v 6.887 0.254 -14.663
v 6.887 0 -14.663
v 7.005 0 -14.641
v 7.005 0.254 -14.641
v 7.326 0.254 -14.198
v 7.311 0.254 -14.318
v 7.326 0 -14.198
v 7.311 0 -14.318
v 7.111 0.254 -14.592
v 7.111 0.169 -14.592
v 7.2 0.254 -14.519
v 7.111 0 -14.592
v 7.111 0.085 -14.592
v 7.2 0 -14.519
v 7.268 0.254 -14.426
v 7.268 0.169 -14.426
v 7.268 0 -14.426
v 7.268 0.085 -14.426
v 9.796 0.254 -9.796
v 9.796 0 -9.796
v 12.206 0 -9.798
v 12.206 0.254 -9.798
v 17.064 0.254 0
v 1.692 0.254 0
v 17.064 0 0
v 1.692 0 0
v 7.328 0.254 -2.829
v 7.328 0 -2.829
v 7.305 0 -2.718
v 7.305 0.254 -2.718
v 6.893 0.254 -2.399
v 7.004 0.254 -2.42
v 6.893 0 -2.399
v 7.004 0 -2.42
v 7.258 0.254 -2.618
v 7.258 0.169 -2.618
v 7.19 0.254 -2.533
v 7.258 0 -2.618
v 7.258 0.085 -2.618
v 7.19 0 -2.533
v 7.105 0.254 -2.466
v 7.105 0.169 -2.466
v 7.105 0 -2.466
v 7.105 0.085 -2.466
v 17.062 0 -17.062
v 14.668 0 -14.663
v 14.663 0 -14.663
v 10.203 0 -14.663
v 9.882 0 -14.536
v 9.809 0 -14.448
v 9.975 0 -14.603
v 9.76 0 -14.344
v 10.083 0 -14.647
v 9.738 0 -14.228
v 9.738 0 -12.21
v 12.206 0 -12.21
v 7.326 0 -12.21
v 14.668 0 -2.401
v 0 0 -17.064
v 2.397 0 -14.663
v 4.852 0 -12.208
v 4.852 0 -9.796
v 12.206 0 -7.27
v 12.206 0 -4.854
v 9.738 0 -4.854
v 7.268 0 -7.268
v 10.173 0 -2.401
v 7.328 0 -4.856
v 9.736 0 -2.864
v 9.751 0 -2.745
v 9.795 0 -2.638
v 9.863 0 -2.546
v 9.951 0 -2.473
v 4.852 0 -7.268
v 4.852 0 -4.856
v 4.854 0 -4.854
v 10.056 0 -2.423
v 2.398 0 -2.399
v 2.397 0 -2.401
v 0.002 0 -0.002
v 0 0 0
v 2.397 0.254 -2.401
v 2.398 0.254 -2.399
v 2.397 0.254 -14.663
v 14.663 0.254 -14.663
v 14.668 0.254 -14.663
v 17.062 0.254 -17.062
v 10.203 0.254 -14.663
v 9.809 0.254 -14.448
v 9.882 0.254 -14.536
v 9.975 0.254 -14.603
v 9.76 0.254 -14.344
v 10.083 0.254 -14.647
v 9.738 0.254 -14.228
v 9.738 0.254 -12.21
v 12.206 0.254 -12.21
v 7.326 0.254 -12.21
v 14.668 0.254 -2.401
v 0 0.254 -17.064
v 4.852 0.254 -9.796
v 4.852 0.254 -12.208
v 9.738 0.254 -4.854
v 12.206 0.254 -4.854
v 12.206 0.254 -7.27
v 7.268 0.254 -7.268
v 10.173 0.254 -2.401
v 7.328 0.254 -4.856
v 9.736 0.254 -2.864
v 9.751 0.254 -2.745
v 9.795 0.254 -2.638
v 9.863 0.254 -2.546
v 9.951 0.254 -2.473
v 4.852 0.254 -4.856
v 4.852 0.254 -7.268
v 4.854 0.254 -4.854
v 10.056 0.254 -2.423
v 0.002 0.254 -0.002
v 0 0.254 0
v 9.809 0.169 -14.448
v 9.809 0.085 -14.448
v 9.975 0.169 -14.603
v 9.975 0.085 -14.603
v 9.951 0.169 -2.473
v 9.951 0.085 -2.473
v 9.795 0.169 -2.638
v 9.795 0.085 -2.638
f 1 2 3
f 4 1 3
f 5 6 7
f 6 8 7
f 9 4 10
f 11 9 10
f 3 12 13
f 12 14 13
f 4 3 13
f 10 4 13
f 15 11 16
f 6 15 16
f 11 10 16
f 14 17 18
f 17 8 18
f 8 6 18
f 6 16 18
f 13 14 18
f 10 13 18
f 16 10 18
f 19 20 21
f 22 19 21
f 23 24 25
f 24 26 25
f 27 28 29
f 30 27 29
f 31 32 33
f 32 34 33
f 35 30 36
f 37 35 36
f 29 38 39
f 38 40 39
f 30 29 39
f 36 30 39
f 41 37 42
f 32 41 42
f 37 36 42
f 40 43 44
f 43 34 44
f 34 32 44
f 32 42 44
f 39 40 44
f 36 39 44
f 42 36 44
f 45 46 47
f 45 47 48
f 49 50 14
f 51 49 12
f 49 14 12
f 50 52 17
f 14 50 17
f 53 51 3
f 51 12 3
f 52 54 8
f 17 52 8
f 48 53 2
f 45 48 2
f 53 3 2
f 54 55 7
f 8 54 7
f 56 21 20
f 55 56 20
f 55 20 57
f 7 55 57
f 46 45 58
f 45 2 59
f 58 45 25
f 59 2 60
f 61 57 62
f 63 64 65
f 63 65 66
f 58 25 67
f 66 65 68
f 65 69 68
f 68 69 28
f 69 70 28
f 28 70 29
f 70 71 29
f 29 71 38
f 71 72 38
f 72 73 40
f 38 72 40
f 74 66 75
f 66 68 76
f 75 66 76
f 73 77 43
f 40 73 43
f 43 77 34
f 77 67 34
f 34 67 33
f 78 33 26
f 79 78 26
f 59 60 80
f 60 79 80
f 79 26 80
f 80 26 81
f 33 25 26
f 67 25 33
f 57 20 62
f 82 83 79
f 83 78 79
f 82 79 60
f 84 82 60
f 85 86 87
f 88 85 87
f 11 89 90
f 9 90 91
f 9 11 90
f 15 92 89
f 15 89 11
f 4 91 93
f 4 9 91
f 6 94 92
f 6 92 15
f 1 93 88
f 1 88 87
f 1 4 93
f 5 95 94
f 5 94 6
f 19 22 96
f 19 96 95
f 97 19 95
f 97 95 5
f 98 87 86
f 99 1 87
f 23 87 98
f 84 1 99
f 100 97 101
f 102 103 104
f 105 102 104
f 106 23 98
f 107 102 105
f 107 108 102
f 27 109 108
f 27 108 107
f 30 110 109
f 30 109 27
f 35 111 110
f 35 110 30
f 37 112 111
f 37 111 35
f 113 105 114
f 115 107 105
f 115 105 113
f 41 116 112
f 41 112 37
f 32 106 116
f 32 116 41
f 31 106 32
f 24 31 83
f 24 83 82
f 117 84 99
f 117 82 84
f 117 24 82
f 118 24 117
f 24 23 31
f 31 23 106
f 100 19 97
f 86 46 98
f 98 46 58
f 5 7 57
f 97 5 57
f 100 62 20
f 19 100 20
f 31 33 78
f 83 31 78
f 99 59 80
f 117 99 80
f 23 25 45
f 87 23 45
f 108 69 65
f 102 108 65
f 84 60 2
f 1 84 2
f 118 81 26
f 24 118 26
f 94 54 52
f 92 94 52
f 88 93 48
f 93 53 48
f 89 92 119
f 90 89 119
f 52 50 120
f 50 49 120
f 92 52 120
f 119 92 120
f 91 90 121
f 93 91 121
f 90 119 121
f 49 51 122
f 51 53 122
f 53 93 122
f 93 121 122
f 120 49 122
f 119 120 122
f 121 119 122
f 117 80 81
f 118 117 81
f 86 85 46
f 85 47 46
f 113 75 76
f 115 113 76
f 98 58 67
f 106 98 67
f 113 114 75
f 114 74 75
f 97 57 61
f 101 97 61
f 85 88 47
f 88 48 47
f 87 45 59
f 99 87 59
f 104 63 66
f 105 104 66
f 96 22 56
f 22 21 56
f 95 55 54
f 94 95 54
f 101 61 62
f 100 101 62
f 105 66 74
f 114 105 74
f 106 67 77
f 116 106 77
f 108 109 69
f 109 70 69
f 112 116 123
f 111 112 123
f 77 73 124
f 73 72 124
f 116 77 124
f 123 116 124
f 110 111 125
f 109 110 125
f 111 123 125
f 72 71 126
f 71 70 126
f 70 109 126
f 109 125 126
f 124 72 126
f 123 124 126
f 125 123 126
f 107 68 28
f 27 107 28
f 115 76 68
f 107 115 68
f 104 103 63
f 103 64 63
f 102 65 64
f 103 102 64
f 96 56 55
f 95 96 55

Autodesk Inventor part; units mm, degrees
ref_plane "YZ Plane" through (0, 0, 0) normal (1, 0, 0) x (0, 1, 0)
ref_plane "XZ Plane" through (0, 0, 0) normal (0, 1, 0) x (-1, 0, 0)
ref_plane "XY Plane" through (0, 0, 0) normal (0, 0, 1) x (1, 0, 0)
sketch "Sketch1" plane through (0, 0, 0) normal (0, 1, 0) x (-1, 0, 0)
  line L0 (0.0001, 0.003) -> (0.0001, 0)
  line L1 (0.0001, -17.064) -> (-0.002, -0.0021)
  line L2 (-2.3966, -2.4008) -> (-2.3966, -14.6631)
  line L3 (-2.3966, -14.6631) -> (-6.8866, -14.6631)
  spline S0 degree 3 poles (-6.8866, -14.6631) (-7.1334, -14.6502) (-7.3283, -14.4466) (-7.3261, -14.1977) knots 2 2 2 2 3 3 3 3
  line L4 (-6.8866, -14.6631) -> (-7.1334, -14.6502) construction
  line L5 (-7.1334, -14.6502) -> (-7.3283, -14.4466) construction
  line L6 (-7.3283, -14.4466) -> (-7.3261, -14.1977) construction
  line L7 (-7.2677, -7.2678) -> (-4.8517, -7.2677)
  line L8 (-9.7961, -9.7964) -> (-12.2057, -9.7985)
  line L9 (-4.8515, -9.7963) -> (-9.7961, -9.7964)
  line L10 (-4.8515, -12.2081) -> (-4.8515, -9.7963)
  line L11 (-7.3261, -12.2103) -> (-4.8515, -12.2081)
  line L12 (-7.3261, -14.1977) -> (-7.3261, -12.2103)
  line L13 (-12.2057, -9.7985) -> (-12.206, -12.2102)
  line L14 (-17.0619, -17.062) -> (0.0001, -17.064)
  line L15 (-12.206, -12.2102) -> (-9.7379, -12.2102)
  line L16 (-9.7379, -12.2102) -> (-9.7379, -14.228)
  line L17 (-9.7379, -14.228) -> (-9.7509, -14.4705) construction
  spline S1 degree 3 poles (-9.7379, -14.228) (-9.7509, -14.4705) (-9.9544, -14.661) (-10.2034, -14.6631) knots 11 11 11 11 12 12 12 12
  line L18 (-9.7509, -14.4705) -> (-9.9544, -14.661) construction
  line L19 (-9.9544, -14.661) -> (-10.2034, -14.6631) construction
  line L20 (-14.6632, -14.6631) -> (-14.6675, -14.6631)
  line L21 (-10.2034, -14.6631) -> (-14.6632, -14.6631)
  line L22 (-17.064, 0.0001) -> (-17.0619, -17.062)
  line L23 (-12.206, -7.2698) -> (-7.2677, -7.2678)
  line L24 (-14.6675, -14.6631) -> (-14.6676, -2.4008)
  line L25 (-12.206, -4.8538) -> (-12.206, -7.2698)
  line L26 (-9.7357, -2.8642) -> (-9.738, -4.8538)
  line L27 (-9.738, -4.8538) -> (-12.206, -4.8538)
  line L28 (-9.7357, -2.6174) -> (-9.7357, -2.8642) construction
  spline S2 degree 3 poles (-10.1731, -2.4009) (-9.9285, -2.4159) (-9.7357, -2.6174) (-9.7357, -2.8642) knots 16 16 16 16 17 17 17 17
  line L29 (-10.1731, -2.4009) -> (-9.9285, -2.4159) construction
  line L30 (-9.9285, -2.4159) -> (-9.7357, -2.6174) construction
  line L31 (-14.6676, -2.4008) -> (-10.1731, -2.4009)
  line L32 (-0.002, -0.0021) -> (0.0001, 0)
  line L33 (0.0001, 0) -> (-17.064, 0.0001)
  line L34 (-4.8517, -7.2677) -> (-4.8516, -4.8558)
  line L35 (-7.3282, -4.8559) -> (-7.3282, -2.8294)
  line L36 (-4.8536, -4.8537) -> (-7.3282, -4.8559)
  line L37 (-7.3087, -2.5977) -> (-7.1248, -2.4138) construction
  spline S3 degree 3 poles (-7.3282, -2.8294) (-7.3087, -2.5977) (-7.1248, -2.4138) (-6.893, -2.3986) knots 26 26 26 26 27 27 27 27
  line L38 (-7.3282, -2.8294) -> (-7.3087, -2.5977) construction
  line L39 (-7.1248, -2.4138) -> (-6.893, -2.3986) construction
  line L40 (-4.8516, -4.8558) -> (-4.8536, -4.8537)
  line L41 (-6.893, -2.3986) -> (-2.3985, -2.3986)
  line L42 (-2.3985, -2.3986) -> (-2.3964, -2.4007)
  line L43 (-2.3964, -2.4007) -> (-2.3966, -2.4008)
  line L44 (15.402, -0.0001) -> (-1.6922, 0)
  dimension "d2" = 17.0942
extrude "Extrusion1" add sketch "Sketch1" along normal blind 0.254
properties part number "Logo Inlay"
